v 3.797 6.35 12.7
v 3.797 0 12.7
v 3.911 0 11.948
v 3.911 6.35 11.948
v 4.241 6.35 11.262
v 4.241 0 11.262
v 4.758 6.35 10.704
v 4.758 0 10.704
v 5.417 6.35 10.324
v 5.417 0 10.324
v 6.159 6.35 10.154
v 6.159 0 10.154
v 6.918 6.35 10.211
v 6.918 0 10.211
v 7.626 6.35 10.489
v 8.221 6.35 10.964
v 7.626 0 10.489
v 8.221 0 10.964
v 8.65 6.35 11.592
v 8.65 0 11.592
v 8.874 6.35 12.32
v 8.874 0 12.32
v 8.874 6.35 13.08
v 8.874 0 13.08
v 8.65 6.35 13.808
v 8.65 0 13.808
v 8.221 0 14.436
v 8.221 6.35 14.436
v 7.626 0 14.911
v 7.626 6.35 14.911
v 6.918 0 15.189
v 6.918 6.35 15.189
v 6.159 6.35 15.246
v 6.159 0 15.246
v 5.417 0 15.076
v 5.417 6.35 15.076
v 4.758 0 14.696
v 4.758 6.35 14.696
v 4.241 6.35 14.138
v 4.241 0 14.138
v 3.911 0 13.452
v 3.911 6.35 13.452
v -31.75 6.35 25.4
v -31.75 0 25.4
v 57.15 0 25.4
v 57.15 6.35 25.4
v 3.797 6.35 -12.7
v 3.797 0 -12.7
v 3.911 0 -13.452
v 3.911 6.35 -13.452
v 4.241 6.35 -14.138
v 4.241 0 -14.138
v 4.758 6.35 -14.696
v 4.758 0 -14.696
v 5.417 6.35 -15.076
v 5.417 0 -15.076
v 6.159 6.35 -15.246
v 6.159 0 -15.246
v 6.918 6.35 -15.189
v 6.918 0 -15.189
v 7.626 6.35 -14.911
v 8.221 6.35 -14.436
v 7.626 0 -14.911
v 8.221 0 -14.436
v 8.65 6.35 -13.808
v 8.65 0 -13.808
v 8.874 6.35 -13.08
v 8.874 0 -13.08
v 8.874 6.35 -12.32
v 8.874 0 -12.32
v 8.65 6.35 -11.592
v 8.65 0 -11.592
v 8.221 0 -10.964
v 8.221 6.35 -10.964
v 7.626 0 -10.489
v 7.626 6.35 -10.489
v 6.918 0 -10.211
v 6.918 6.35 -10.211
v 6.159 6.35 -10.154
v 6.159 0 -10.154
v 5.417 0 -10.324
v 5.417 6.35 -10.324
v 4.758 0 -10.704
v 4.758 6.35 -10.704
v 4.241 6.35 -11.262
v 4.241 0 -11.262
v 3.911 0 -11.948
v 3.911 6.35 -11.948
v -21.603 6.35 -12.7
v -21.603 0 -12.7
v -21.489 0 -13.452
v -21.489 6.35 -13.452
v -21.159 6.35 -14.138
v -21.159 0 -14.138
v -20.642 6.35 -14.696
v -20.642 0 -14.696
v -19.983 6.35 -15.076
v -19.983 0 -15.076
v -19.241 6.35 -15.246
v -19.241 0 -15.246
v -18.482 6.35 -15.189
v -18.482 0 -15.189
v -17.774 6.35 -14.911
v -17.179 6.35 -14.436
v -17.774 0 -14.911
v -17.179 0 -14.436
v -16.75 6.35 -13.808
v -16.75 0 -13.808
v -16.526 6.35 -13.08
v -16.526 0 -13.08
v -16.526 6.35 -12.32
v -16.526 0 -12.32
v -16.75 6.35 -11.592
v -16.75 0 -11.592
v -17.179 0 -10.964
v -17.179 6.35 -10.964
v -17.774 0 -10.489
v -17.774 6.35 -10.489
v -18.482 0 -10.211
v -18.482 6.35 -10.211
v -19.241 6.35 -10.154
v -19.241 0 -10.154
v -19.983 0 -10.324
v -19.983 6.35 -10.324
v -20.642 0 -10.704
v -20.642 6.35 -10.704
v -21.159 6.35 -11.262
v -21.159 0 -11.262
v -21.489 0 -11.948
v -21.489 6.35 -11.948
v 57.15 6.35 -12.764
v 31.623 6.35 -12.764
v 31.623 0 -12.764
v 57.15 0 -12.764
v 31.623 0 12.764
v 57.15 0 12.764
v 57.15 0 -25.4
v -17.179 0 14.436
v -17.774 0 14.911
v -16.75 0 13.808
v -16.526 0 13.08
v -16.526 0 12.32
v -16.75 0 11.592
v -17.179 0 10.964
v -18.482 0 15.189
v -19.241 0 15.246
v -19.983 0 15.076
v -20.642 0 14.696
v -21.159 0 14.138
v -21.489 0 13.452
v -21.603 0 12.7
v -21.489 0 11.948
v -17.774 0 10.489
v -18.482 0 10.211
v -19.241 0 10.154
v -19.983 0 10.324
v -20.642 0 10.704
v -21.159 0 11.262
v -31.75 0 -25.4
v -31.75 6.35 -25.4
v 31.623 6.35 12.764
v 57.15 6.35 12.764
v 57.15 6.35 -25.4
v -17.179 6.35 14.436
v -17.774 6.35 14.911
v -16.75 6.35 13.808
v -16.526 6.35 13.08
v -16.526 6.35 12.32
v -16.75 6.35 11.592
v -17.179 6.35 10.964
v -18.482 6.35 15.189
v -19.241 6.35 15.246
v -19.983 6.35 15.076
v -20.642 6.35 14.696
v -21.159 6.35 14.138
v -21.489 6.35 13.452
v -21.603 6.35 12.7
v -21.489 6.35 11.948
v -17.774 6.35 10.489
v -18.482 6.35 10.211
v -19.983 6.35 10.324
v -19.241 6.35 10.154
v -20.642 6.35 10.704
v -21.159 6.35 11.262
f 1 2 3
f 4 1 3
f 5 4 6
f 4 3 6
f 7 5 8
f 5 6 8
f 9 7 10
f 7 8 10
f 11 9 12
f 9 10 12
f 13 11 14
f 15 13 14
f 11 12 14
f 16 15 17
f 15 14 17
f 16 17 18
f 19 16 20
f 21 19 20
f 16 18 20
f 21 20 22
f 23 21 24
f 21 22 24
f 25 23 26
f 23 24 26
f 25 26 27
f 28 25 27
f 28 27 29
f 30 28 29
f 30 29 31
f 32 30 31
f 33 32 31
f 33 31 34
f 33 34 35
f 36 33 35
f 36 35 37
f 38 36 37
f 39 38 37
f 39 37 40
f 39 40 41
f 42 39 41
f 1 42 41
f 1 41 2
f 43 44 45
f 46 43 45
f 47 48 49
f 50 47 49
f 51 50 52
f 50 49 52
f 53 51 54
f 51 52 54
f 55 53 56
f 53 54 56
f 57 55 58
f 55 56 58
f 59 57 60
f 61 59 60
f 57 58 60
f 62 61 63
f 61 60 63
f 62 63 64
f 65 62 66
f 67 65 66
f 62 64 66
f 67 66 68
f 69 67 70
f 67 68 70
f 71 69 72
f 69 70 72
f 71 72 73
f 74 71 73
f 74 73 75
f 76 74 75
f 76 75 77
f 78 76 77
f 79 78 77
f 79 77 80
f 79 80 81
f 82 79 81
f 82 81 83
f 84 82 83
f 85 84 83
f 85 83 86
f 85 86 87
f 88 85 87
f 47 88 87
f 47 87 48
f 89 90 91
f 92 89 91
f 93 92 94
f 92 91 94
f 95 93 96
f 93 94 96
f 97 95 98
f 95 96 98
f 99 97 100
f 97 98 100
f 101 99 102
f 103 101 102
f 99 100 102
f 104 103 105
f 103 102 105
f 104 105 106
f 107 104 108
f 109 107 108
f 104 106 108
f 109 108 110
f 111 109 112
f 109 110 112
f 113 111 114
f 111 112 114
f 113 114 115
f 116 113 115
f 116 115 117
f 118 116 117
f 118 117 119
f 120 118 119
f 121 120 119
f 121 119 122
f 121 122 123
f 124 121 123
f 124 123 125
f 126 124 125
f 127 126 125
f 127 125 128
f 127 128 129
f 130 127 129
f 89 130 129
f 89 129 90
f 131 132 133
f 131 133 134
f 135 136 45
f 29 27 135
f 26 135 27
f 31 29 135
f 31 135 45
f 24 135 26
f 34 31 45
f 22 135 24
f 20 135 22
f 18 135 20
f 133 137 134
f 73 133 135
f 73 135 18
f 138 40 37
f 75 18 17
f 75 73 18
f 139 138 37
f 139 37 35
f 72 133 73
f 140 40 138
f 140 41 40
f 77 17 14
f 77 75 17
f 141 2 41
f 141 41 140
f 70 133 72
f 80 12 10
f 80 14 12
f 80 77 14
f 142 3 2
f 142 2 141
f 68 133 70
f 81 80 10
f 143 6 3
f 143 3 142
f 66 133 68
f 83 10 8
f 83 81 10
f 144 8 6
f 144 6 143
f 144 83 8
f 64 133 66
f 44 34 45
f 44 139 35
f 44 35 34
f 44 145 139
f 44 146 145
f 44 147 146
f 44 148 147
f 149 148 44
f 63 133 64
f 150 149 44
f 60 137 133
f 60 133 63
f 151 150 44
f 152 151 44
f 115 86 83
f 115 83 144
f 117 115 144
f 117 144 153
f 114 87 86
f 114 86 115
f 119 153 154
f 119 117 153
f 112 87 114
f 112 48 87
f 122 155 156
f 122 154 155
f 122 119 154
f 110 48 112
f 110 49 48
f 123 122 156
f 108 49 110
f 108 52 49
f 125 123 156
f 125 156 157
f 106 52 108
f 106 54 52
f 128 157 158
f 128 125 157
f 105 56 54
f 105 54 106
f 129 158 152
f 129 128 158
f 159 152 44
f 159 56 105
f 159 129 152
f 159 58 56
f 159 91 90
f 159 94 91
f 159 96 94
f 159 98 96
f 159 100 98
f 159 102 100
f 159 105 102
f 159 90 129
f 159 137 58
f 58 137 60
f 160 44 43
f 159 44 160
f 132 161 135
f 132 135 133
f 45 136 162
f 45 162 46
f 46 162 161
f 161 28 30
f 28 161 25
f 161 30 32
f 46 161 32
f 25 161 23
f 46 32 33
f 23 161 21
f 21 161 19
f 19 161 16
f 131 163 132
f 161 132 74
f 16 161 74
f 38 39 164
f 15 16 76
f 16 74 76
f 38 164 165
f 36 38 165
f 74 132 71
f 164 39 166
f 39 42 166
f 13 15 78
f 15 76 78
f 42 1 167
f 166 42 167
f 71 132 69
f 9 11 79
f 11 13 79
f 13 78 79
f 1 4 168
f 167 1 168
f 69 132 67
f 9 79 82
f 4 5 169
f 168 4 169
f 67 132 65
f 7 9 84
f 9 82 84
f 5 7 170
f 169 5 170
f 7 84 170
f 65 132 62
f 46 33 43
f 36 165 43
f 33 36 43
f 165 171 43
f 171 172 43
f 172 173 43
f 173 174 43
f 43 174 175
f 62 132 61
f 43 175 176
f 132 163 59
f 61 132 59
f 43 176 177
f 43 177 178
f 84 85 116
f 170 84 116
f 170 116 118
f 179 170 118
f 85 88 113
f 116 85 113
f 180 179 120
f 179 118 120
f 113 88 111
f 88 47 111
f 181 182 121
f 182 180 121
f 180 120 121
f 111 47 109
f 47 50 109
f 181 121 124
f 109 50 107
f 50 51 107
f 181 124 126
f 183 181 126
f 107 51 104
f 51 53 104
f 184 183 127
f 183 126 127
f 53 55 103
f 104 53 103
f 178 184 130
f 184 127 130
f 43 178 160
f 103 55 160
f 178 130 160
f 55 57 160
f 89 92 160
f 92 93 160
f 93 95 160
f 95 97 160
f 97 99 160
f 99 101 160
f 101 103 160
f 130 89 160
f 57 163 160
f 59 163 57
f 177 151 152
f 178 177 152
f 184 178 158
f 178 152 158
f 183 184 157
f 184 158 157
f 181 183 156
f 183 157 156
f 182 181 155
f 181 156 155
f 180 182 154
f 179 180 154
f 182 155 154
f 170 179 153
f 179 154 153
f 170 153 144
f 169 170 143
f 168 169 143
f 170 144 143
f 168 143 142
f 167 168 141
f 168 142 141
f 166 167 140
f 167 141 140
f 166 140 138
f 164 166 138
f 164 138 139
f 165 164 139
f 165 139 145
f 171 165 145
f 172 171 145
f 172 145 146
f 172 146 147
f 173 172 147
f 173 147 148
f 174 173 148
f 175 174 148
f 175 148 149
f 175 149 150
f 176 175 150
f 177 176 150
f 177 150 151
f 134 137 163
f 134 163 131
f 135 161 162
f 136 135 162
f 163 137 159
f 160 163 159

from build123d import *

# Parameters (mm, degrees)
BOSS_EXTRUDE1_DEPTH    = 6.35
F_10_CLEARANCE_HOLE1_D = 5.1054
SKETCH5_W              = 25.527
SKETCH5_H              = 25.527
CUT_EXTRUDE1_DEPTH     = 63.861792847


with BuildPart() as part:
    # Sketch1 → Boss-Extrude1 (new body)
    with BuildSketch(Plane(origin=(0, 0, 0), x_dir=(1, 0, 0), z_dir=(0, 1, 0))):
        Polygon((31.75, 25.4), (57.15, 25.4), (57.15, -25.4), (31.75, -25.4), (-31.75, -25.4), (-31.75, 25.4), align=None)
    extrude(amount=BOSS_EXTRUDE1_DEPTH)

    # #10 Clearance Hole1 (through all)
    with Locations(Plane(origin=(0, 6.35, 0), x_dir=(1, 0, 0), z_dir=(0, 1, 0))):
        with Locations((-19.05, 12.7), (6.35, 12.7), (6.35, -12.7), (-19.05, -12.7)):
            Hole(F_10_CLEARANCE_HOLE1_D / 2)

    # Sketch5 → Cut-Extrude1 (cut, through all)
    with BuildSketch(Plane(origin=(0, 6.35, 0), x_dir=(1, 0, 0), z_dir=(0, 1, 0))):
        with Locations((44.3865, 0)):
            Rectangle(SKETCH5_W, SKETCH5_H)
    extrude(amount=-CUT_EXTRUDE1_DEPTH, mode=Mode.SUBTRACT)


solid = part.part
